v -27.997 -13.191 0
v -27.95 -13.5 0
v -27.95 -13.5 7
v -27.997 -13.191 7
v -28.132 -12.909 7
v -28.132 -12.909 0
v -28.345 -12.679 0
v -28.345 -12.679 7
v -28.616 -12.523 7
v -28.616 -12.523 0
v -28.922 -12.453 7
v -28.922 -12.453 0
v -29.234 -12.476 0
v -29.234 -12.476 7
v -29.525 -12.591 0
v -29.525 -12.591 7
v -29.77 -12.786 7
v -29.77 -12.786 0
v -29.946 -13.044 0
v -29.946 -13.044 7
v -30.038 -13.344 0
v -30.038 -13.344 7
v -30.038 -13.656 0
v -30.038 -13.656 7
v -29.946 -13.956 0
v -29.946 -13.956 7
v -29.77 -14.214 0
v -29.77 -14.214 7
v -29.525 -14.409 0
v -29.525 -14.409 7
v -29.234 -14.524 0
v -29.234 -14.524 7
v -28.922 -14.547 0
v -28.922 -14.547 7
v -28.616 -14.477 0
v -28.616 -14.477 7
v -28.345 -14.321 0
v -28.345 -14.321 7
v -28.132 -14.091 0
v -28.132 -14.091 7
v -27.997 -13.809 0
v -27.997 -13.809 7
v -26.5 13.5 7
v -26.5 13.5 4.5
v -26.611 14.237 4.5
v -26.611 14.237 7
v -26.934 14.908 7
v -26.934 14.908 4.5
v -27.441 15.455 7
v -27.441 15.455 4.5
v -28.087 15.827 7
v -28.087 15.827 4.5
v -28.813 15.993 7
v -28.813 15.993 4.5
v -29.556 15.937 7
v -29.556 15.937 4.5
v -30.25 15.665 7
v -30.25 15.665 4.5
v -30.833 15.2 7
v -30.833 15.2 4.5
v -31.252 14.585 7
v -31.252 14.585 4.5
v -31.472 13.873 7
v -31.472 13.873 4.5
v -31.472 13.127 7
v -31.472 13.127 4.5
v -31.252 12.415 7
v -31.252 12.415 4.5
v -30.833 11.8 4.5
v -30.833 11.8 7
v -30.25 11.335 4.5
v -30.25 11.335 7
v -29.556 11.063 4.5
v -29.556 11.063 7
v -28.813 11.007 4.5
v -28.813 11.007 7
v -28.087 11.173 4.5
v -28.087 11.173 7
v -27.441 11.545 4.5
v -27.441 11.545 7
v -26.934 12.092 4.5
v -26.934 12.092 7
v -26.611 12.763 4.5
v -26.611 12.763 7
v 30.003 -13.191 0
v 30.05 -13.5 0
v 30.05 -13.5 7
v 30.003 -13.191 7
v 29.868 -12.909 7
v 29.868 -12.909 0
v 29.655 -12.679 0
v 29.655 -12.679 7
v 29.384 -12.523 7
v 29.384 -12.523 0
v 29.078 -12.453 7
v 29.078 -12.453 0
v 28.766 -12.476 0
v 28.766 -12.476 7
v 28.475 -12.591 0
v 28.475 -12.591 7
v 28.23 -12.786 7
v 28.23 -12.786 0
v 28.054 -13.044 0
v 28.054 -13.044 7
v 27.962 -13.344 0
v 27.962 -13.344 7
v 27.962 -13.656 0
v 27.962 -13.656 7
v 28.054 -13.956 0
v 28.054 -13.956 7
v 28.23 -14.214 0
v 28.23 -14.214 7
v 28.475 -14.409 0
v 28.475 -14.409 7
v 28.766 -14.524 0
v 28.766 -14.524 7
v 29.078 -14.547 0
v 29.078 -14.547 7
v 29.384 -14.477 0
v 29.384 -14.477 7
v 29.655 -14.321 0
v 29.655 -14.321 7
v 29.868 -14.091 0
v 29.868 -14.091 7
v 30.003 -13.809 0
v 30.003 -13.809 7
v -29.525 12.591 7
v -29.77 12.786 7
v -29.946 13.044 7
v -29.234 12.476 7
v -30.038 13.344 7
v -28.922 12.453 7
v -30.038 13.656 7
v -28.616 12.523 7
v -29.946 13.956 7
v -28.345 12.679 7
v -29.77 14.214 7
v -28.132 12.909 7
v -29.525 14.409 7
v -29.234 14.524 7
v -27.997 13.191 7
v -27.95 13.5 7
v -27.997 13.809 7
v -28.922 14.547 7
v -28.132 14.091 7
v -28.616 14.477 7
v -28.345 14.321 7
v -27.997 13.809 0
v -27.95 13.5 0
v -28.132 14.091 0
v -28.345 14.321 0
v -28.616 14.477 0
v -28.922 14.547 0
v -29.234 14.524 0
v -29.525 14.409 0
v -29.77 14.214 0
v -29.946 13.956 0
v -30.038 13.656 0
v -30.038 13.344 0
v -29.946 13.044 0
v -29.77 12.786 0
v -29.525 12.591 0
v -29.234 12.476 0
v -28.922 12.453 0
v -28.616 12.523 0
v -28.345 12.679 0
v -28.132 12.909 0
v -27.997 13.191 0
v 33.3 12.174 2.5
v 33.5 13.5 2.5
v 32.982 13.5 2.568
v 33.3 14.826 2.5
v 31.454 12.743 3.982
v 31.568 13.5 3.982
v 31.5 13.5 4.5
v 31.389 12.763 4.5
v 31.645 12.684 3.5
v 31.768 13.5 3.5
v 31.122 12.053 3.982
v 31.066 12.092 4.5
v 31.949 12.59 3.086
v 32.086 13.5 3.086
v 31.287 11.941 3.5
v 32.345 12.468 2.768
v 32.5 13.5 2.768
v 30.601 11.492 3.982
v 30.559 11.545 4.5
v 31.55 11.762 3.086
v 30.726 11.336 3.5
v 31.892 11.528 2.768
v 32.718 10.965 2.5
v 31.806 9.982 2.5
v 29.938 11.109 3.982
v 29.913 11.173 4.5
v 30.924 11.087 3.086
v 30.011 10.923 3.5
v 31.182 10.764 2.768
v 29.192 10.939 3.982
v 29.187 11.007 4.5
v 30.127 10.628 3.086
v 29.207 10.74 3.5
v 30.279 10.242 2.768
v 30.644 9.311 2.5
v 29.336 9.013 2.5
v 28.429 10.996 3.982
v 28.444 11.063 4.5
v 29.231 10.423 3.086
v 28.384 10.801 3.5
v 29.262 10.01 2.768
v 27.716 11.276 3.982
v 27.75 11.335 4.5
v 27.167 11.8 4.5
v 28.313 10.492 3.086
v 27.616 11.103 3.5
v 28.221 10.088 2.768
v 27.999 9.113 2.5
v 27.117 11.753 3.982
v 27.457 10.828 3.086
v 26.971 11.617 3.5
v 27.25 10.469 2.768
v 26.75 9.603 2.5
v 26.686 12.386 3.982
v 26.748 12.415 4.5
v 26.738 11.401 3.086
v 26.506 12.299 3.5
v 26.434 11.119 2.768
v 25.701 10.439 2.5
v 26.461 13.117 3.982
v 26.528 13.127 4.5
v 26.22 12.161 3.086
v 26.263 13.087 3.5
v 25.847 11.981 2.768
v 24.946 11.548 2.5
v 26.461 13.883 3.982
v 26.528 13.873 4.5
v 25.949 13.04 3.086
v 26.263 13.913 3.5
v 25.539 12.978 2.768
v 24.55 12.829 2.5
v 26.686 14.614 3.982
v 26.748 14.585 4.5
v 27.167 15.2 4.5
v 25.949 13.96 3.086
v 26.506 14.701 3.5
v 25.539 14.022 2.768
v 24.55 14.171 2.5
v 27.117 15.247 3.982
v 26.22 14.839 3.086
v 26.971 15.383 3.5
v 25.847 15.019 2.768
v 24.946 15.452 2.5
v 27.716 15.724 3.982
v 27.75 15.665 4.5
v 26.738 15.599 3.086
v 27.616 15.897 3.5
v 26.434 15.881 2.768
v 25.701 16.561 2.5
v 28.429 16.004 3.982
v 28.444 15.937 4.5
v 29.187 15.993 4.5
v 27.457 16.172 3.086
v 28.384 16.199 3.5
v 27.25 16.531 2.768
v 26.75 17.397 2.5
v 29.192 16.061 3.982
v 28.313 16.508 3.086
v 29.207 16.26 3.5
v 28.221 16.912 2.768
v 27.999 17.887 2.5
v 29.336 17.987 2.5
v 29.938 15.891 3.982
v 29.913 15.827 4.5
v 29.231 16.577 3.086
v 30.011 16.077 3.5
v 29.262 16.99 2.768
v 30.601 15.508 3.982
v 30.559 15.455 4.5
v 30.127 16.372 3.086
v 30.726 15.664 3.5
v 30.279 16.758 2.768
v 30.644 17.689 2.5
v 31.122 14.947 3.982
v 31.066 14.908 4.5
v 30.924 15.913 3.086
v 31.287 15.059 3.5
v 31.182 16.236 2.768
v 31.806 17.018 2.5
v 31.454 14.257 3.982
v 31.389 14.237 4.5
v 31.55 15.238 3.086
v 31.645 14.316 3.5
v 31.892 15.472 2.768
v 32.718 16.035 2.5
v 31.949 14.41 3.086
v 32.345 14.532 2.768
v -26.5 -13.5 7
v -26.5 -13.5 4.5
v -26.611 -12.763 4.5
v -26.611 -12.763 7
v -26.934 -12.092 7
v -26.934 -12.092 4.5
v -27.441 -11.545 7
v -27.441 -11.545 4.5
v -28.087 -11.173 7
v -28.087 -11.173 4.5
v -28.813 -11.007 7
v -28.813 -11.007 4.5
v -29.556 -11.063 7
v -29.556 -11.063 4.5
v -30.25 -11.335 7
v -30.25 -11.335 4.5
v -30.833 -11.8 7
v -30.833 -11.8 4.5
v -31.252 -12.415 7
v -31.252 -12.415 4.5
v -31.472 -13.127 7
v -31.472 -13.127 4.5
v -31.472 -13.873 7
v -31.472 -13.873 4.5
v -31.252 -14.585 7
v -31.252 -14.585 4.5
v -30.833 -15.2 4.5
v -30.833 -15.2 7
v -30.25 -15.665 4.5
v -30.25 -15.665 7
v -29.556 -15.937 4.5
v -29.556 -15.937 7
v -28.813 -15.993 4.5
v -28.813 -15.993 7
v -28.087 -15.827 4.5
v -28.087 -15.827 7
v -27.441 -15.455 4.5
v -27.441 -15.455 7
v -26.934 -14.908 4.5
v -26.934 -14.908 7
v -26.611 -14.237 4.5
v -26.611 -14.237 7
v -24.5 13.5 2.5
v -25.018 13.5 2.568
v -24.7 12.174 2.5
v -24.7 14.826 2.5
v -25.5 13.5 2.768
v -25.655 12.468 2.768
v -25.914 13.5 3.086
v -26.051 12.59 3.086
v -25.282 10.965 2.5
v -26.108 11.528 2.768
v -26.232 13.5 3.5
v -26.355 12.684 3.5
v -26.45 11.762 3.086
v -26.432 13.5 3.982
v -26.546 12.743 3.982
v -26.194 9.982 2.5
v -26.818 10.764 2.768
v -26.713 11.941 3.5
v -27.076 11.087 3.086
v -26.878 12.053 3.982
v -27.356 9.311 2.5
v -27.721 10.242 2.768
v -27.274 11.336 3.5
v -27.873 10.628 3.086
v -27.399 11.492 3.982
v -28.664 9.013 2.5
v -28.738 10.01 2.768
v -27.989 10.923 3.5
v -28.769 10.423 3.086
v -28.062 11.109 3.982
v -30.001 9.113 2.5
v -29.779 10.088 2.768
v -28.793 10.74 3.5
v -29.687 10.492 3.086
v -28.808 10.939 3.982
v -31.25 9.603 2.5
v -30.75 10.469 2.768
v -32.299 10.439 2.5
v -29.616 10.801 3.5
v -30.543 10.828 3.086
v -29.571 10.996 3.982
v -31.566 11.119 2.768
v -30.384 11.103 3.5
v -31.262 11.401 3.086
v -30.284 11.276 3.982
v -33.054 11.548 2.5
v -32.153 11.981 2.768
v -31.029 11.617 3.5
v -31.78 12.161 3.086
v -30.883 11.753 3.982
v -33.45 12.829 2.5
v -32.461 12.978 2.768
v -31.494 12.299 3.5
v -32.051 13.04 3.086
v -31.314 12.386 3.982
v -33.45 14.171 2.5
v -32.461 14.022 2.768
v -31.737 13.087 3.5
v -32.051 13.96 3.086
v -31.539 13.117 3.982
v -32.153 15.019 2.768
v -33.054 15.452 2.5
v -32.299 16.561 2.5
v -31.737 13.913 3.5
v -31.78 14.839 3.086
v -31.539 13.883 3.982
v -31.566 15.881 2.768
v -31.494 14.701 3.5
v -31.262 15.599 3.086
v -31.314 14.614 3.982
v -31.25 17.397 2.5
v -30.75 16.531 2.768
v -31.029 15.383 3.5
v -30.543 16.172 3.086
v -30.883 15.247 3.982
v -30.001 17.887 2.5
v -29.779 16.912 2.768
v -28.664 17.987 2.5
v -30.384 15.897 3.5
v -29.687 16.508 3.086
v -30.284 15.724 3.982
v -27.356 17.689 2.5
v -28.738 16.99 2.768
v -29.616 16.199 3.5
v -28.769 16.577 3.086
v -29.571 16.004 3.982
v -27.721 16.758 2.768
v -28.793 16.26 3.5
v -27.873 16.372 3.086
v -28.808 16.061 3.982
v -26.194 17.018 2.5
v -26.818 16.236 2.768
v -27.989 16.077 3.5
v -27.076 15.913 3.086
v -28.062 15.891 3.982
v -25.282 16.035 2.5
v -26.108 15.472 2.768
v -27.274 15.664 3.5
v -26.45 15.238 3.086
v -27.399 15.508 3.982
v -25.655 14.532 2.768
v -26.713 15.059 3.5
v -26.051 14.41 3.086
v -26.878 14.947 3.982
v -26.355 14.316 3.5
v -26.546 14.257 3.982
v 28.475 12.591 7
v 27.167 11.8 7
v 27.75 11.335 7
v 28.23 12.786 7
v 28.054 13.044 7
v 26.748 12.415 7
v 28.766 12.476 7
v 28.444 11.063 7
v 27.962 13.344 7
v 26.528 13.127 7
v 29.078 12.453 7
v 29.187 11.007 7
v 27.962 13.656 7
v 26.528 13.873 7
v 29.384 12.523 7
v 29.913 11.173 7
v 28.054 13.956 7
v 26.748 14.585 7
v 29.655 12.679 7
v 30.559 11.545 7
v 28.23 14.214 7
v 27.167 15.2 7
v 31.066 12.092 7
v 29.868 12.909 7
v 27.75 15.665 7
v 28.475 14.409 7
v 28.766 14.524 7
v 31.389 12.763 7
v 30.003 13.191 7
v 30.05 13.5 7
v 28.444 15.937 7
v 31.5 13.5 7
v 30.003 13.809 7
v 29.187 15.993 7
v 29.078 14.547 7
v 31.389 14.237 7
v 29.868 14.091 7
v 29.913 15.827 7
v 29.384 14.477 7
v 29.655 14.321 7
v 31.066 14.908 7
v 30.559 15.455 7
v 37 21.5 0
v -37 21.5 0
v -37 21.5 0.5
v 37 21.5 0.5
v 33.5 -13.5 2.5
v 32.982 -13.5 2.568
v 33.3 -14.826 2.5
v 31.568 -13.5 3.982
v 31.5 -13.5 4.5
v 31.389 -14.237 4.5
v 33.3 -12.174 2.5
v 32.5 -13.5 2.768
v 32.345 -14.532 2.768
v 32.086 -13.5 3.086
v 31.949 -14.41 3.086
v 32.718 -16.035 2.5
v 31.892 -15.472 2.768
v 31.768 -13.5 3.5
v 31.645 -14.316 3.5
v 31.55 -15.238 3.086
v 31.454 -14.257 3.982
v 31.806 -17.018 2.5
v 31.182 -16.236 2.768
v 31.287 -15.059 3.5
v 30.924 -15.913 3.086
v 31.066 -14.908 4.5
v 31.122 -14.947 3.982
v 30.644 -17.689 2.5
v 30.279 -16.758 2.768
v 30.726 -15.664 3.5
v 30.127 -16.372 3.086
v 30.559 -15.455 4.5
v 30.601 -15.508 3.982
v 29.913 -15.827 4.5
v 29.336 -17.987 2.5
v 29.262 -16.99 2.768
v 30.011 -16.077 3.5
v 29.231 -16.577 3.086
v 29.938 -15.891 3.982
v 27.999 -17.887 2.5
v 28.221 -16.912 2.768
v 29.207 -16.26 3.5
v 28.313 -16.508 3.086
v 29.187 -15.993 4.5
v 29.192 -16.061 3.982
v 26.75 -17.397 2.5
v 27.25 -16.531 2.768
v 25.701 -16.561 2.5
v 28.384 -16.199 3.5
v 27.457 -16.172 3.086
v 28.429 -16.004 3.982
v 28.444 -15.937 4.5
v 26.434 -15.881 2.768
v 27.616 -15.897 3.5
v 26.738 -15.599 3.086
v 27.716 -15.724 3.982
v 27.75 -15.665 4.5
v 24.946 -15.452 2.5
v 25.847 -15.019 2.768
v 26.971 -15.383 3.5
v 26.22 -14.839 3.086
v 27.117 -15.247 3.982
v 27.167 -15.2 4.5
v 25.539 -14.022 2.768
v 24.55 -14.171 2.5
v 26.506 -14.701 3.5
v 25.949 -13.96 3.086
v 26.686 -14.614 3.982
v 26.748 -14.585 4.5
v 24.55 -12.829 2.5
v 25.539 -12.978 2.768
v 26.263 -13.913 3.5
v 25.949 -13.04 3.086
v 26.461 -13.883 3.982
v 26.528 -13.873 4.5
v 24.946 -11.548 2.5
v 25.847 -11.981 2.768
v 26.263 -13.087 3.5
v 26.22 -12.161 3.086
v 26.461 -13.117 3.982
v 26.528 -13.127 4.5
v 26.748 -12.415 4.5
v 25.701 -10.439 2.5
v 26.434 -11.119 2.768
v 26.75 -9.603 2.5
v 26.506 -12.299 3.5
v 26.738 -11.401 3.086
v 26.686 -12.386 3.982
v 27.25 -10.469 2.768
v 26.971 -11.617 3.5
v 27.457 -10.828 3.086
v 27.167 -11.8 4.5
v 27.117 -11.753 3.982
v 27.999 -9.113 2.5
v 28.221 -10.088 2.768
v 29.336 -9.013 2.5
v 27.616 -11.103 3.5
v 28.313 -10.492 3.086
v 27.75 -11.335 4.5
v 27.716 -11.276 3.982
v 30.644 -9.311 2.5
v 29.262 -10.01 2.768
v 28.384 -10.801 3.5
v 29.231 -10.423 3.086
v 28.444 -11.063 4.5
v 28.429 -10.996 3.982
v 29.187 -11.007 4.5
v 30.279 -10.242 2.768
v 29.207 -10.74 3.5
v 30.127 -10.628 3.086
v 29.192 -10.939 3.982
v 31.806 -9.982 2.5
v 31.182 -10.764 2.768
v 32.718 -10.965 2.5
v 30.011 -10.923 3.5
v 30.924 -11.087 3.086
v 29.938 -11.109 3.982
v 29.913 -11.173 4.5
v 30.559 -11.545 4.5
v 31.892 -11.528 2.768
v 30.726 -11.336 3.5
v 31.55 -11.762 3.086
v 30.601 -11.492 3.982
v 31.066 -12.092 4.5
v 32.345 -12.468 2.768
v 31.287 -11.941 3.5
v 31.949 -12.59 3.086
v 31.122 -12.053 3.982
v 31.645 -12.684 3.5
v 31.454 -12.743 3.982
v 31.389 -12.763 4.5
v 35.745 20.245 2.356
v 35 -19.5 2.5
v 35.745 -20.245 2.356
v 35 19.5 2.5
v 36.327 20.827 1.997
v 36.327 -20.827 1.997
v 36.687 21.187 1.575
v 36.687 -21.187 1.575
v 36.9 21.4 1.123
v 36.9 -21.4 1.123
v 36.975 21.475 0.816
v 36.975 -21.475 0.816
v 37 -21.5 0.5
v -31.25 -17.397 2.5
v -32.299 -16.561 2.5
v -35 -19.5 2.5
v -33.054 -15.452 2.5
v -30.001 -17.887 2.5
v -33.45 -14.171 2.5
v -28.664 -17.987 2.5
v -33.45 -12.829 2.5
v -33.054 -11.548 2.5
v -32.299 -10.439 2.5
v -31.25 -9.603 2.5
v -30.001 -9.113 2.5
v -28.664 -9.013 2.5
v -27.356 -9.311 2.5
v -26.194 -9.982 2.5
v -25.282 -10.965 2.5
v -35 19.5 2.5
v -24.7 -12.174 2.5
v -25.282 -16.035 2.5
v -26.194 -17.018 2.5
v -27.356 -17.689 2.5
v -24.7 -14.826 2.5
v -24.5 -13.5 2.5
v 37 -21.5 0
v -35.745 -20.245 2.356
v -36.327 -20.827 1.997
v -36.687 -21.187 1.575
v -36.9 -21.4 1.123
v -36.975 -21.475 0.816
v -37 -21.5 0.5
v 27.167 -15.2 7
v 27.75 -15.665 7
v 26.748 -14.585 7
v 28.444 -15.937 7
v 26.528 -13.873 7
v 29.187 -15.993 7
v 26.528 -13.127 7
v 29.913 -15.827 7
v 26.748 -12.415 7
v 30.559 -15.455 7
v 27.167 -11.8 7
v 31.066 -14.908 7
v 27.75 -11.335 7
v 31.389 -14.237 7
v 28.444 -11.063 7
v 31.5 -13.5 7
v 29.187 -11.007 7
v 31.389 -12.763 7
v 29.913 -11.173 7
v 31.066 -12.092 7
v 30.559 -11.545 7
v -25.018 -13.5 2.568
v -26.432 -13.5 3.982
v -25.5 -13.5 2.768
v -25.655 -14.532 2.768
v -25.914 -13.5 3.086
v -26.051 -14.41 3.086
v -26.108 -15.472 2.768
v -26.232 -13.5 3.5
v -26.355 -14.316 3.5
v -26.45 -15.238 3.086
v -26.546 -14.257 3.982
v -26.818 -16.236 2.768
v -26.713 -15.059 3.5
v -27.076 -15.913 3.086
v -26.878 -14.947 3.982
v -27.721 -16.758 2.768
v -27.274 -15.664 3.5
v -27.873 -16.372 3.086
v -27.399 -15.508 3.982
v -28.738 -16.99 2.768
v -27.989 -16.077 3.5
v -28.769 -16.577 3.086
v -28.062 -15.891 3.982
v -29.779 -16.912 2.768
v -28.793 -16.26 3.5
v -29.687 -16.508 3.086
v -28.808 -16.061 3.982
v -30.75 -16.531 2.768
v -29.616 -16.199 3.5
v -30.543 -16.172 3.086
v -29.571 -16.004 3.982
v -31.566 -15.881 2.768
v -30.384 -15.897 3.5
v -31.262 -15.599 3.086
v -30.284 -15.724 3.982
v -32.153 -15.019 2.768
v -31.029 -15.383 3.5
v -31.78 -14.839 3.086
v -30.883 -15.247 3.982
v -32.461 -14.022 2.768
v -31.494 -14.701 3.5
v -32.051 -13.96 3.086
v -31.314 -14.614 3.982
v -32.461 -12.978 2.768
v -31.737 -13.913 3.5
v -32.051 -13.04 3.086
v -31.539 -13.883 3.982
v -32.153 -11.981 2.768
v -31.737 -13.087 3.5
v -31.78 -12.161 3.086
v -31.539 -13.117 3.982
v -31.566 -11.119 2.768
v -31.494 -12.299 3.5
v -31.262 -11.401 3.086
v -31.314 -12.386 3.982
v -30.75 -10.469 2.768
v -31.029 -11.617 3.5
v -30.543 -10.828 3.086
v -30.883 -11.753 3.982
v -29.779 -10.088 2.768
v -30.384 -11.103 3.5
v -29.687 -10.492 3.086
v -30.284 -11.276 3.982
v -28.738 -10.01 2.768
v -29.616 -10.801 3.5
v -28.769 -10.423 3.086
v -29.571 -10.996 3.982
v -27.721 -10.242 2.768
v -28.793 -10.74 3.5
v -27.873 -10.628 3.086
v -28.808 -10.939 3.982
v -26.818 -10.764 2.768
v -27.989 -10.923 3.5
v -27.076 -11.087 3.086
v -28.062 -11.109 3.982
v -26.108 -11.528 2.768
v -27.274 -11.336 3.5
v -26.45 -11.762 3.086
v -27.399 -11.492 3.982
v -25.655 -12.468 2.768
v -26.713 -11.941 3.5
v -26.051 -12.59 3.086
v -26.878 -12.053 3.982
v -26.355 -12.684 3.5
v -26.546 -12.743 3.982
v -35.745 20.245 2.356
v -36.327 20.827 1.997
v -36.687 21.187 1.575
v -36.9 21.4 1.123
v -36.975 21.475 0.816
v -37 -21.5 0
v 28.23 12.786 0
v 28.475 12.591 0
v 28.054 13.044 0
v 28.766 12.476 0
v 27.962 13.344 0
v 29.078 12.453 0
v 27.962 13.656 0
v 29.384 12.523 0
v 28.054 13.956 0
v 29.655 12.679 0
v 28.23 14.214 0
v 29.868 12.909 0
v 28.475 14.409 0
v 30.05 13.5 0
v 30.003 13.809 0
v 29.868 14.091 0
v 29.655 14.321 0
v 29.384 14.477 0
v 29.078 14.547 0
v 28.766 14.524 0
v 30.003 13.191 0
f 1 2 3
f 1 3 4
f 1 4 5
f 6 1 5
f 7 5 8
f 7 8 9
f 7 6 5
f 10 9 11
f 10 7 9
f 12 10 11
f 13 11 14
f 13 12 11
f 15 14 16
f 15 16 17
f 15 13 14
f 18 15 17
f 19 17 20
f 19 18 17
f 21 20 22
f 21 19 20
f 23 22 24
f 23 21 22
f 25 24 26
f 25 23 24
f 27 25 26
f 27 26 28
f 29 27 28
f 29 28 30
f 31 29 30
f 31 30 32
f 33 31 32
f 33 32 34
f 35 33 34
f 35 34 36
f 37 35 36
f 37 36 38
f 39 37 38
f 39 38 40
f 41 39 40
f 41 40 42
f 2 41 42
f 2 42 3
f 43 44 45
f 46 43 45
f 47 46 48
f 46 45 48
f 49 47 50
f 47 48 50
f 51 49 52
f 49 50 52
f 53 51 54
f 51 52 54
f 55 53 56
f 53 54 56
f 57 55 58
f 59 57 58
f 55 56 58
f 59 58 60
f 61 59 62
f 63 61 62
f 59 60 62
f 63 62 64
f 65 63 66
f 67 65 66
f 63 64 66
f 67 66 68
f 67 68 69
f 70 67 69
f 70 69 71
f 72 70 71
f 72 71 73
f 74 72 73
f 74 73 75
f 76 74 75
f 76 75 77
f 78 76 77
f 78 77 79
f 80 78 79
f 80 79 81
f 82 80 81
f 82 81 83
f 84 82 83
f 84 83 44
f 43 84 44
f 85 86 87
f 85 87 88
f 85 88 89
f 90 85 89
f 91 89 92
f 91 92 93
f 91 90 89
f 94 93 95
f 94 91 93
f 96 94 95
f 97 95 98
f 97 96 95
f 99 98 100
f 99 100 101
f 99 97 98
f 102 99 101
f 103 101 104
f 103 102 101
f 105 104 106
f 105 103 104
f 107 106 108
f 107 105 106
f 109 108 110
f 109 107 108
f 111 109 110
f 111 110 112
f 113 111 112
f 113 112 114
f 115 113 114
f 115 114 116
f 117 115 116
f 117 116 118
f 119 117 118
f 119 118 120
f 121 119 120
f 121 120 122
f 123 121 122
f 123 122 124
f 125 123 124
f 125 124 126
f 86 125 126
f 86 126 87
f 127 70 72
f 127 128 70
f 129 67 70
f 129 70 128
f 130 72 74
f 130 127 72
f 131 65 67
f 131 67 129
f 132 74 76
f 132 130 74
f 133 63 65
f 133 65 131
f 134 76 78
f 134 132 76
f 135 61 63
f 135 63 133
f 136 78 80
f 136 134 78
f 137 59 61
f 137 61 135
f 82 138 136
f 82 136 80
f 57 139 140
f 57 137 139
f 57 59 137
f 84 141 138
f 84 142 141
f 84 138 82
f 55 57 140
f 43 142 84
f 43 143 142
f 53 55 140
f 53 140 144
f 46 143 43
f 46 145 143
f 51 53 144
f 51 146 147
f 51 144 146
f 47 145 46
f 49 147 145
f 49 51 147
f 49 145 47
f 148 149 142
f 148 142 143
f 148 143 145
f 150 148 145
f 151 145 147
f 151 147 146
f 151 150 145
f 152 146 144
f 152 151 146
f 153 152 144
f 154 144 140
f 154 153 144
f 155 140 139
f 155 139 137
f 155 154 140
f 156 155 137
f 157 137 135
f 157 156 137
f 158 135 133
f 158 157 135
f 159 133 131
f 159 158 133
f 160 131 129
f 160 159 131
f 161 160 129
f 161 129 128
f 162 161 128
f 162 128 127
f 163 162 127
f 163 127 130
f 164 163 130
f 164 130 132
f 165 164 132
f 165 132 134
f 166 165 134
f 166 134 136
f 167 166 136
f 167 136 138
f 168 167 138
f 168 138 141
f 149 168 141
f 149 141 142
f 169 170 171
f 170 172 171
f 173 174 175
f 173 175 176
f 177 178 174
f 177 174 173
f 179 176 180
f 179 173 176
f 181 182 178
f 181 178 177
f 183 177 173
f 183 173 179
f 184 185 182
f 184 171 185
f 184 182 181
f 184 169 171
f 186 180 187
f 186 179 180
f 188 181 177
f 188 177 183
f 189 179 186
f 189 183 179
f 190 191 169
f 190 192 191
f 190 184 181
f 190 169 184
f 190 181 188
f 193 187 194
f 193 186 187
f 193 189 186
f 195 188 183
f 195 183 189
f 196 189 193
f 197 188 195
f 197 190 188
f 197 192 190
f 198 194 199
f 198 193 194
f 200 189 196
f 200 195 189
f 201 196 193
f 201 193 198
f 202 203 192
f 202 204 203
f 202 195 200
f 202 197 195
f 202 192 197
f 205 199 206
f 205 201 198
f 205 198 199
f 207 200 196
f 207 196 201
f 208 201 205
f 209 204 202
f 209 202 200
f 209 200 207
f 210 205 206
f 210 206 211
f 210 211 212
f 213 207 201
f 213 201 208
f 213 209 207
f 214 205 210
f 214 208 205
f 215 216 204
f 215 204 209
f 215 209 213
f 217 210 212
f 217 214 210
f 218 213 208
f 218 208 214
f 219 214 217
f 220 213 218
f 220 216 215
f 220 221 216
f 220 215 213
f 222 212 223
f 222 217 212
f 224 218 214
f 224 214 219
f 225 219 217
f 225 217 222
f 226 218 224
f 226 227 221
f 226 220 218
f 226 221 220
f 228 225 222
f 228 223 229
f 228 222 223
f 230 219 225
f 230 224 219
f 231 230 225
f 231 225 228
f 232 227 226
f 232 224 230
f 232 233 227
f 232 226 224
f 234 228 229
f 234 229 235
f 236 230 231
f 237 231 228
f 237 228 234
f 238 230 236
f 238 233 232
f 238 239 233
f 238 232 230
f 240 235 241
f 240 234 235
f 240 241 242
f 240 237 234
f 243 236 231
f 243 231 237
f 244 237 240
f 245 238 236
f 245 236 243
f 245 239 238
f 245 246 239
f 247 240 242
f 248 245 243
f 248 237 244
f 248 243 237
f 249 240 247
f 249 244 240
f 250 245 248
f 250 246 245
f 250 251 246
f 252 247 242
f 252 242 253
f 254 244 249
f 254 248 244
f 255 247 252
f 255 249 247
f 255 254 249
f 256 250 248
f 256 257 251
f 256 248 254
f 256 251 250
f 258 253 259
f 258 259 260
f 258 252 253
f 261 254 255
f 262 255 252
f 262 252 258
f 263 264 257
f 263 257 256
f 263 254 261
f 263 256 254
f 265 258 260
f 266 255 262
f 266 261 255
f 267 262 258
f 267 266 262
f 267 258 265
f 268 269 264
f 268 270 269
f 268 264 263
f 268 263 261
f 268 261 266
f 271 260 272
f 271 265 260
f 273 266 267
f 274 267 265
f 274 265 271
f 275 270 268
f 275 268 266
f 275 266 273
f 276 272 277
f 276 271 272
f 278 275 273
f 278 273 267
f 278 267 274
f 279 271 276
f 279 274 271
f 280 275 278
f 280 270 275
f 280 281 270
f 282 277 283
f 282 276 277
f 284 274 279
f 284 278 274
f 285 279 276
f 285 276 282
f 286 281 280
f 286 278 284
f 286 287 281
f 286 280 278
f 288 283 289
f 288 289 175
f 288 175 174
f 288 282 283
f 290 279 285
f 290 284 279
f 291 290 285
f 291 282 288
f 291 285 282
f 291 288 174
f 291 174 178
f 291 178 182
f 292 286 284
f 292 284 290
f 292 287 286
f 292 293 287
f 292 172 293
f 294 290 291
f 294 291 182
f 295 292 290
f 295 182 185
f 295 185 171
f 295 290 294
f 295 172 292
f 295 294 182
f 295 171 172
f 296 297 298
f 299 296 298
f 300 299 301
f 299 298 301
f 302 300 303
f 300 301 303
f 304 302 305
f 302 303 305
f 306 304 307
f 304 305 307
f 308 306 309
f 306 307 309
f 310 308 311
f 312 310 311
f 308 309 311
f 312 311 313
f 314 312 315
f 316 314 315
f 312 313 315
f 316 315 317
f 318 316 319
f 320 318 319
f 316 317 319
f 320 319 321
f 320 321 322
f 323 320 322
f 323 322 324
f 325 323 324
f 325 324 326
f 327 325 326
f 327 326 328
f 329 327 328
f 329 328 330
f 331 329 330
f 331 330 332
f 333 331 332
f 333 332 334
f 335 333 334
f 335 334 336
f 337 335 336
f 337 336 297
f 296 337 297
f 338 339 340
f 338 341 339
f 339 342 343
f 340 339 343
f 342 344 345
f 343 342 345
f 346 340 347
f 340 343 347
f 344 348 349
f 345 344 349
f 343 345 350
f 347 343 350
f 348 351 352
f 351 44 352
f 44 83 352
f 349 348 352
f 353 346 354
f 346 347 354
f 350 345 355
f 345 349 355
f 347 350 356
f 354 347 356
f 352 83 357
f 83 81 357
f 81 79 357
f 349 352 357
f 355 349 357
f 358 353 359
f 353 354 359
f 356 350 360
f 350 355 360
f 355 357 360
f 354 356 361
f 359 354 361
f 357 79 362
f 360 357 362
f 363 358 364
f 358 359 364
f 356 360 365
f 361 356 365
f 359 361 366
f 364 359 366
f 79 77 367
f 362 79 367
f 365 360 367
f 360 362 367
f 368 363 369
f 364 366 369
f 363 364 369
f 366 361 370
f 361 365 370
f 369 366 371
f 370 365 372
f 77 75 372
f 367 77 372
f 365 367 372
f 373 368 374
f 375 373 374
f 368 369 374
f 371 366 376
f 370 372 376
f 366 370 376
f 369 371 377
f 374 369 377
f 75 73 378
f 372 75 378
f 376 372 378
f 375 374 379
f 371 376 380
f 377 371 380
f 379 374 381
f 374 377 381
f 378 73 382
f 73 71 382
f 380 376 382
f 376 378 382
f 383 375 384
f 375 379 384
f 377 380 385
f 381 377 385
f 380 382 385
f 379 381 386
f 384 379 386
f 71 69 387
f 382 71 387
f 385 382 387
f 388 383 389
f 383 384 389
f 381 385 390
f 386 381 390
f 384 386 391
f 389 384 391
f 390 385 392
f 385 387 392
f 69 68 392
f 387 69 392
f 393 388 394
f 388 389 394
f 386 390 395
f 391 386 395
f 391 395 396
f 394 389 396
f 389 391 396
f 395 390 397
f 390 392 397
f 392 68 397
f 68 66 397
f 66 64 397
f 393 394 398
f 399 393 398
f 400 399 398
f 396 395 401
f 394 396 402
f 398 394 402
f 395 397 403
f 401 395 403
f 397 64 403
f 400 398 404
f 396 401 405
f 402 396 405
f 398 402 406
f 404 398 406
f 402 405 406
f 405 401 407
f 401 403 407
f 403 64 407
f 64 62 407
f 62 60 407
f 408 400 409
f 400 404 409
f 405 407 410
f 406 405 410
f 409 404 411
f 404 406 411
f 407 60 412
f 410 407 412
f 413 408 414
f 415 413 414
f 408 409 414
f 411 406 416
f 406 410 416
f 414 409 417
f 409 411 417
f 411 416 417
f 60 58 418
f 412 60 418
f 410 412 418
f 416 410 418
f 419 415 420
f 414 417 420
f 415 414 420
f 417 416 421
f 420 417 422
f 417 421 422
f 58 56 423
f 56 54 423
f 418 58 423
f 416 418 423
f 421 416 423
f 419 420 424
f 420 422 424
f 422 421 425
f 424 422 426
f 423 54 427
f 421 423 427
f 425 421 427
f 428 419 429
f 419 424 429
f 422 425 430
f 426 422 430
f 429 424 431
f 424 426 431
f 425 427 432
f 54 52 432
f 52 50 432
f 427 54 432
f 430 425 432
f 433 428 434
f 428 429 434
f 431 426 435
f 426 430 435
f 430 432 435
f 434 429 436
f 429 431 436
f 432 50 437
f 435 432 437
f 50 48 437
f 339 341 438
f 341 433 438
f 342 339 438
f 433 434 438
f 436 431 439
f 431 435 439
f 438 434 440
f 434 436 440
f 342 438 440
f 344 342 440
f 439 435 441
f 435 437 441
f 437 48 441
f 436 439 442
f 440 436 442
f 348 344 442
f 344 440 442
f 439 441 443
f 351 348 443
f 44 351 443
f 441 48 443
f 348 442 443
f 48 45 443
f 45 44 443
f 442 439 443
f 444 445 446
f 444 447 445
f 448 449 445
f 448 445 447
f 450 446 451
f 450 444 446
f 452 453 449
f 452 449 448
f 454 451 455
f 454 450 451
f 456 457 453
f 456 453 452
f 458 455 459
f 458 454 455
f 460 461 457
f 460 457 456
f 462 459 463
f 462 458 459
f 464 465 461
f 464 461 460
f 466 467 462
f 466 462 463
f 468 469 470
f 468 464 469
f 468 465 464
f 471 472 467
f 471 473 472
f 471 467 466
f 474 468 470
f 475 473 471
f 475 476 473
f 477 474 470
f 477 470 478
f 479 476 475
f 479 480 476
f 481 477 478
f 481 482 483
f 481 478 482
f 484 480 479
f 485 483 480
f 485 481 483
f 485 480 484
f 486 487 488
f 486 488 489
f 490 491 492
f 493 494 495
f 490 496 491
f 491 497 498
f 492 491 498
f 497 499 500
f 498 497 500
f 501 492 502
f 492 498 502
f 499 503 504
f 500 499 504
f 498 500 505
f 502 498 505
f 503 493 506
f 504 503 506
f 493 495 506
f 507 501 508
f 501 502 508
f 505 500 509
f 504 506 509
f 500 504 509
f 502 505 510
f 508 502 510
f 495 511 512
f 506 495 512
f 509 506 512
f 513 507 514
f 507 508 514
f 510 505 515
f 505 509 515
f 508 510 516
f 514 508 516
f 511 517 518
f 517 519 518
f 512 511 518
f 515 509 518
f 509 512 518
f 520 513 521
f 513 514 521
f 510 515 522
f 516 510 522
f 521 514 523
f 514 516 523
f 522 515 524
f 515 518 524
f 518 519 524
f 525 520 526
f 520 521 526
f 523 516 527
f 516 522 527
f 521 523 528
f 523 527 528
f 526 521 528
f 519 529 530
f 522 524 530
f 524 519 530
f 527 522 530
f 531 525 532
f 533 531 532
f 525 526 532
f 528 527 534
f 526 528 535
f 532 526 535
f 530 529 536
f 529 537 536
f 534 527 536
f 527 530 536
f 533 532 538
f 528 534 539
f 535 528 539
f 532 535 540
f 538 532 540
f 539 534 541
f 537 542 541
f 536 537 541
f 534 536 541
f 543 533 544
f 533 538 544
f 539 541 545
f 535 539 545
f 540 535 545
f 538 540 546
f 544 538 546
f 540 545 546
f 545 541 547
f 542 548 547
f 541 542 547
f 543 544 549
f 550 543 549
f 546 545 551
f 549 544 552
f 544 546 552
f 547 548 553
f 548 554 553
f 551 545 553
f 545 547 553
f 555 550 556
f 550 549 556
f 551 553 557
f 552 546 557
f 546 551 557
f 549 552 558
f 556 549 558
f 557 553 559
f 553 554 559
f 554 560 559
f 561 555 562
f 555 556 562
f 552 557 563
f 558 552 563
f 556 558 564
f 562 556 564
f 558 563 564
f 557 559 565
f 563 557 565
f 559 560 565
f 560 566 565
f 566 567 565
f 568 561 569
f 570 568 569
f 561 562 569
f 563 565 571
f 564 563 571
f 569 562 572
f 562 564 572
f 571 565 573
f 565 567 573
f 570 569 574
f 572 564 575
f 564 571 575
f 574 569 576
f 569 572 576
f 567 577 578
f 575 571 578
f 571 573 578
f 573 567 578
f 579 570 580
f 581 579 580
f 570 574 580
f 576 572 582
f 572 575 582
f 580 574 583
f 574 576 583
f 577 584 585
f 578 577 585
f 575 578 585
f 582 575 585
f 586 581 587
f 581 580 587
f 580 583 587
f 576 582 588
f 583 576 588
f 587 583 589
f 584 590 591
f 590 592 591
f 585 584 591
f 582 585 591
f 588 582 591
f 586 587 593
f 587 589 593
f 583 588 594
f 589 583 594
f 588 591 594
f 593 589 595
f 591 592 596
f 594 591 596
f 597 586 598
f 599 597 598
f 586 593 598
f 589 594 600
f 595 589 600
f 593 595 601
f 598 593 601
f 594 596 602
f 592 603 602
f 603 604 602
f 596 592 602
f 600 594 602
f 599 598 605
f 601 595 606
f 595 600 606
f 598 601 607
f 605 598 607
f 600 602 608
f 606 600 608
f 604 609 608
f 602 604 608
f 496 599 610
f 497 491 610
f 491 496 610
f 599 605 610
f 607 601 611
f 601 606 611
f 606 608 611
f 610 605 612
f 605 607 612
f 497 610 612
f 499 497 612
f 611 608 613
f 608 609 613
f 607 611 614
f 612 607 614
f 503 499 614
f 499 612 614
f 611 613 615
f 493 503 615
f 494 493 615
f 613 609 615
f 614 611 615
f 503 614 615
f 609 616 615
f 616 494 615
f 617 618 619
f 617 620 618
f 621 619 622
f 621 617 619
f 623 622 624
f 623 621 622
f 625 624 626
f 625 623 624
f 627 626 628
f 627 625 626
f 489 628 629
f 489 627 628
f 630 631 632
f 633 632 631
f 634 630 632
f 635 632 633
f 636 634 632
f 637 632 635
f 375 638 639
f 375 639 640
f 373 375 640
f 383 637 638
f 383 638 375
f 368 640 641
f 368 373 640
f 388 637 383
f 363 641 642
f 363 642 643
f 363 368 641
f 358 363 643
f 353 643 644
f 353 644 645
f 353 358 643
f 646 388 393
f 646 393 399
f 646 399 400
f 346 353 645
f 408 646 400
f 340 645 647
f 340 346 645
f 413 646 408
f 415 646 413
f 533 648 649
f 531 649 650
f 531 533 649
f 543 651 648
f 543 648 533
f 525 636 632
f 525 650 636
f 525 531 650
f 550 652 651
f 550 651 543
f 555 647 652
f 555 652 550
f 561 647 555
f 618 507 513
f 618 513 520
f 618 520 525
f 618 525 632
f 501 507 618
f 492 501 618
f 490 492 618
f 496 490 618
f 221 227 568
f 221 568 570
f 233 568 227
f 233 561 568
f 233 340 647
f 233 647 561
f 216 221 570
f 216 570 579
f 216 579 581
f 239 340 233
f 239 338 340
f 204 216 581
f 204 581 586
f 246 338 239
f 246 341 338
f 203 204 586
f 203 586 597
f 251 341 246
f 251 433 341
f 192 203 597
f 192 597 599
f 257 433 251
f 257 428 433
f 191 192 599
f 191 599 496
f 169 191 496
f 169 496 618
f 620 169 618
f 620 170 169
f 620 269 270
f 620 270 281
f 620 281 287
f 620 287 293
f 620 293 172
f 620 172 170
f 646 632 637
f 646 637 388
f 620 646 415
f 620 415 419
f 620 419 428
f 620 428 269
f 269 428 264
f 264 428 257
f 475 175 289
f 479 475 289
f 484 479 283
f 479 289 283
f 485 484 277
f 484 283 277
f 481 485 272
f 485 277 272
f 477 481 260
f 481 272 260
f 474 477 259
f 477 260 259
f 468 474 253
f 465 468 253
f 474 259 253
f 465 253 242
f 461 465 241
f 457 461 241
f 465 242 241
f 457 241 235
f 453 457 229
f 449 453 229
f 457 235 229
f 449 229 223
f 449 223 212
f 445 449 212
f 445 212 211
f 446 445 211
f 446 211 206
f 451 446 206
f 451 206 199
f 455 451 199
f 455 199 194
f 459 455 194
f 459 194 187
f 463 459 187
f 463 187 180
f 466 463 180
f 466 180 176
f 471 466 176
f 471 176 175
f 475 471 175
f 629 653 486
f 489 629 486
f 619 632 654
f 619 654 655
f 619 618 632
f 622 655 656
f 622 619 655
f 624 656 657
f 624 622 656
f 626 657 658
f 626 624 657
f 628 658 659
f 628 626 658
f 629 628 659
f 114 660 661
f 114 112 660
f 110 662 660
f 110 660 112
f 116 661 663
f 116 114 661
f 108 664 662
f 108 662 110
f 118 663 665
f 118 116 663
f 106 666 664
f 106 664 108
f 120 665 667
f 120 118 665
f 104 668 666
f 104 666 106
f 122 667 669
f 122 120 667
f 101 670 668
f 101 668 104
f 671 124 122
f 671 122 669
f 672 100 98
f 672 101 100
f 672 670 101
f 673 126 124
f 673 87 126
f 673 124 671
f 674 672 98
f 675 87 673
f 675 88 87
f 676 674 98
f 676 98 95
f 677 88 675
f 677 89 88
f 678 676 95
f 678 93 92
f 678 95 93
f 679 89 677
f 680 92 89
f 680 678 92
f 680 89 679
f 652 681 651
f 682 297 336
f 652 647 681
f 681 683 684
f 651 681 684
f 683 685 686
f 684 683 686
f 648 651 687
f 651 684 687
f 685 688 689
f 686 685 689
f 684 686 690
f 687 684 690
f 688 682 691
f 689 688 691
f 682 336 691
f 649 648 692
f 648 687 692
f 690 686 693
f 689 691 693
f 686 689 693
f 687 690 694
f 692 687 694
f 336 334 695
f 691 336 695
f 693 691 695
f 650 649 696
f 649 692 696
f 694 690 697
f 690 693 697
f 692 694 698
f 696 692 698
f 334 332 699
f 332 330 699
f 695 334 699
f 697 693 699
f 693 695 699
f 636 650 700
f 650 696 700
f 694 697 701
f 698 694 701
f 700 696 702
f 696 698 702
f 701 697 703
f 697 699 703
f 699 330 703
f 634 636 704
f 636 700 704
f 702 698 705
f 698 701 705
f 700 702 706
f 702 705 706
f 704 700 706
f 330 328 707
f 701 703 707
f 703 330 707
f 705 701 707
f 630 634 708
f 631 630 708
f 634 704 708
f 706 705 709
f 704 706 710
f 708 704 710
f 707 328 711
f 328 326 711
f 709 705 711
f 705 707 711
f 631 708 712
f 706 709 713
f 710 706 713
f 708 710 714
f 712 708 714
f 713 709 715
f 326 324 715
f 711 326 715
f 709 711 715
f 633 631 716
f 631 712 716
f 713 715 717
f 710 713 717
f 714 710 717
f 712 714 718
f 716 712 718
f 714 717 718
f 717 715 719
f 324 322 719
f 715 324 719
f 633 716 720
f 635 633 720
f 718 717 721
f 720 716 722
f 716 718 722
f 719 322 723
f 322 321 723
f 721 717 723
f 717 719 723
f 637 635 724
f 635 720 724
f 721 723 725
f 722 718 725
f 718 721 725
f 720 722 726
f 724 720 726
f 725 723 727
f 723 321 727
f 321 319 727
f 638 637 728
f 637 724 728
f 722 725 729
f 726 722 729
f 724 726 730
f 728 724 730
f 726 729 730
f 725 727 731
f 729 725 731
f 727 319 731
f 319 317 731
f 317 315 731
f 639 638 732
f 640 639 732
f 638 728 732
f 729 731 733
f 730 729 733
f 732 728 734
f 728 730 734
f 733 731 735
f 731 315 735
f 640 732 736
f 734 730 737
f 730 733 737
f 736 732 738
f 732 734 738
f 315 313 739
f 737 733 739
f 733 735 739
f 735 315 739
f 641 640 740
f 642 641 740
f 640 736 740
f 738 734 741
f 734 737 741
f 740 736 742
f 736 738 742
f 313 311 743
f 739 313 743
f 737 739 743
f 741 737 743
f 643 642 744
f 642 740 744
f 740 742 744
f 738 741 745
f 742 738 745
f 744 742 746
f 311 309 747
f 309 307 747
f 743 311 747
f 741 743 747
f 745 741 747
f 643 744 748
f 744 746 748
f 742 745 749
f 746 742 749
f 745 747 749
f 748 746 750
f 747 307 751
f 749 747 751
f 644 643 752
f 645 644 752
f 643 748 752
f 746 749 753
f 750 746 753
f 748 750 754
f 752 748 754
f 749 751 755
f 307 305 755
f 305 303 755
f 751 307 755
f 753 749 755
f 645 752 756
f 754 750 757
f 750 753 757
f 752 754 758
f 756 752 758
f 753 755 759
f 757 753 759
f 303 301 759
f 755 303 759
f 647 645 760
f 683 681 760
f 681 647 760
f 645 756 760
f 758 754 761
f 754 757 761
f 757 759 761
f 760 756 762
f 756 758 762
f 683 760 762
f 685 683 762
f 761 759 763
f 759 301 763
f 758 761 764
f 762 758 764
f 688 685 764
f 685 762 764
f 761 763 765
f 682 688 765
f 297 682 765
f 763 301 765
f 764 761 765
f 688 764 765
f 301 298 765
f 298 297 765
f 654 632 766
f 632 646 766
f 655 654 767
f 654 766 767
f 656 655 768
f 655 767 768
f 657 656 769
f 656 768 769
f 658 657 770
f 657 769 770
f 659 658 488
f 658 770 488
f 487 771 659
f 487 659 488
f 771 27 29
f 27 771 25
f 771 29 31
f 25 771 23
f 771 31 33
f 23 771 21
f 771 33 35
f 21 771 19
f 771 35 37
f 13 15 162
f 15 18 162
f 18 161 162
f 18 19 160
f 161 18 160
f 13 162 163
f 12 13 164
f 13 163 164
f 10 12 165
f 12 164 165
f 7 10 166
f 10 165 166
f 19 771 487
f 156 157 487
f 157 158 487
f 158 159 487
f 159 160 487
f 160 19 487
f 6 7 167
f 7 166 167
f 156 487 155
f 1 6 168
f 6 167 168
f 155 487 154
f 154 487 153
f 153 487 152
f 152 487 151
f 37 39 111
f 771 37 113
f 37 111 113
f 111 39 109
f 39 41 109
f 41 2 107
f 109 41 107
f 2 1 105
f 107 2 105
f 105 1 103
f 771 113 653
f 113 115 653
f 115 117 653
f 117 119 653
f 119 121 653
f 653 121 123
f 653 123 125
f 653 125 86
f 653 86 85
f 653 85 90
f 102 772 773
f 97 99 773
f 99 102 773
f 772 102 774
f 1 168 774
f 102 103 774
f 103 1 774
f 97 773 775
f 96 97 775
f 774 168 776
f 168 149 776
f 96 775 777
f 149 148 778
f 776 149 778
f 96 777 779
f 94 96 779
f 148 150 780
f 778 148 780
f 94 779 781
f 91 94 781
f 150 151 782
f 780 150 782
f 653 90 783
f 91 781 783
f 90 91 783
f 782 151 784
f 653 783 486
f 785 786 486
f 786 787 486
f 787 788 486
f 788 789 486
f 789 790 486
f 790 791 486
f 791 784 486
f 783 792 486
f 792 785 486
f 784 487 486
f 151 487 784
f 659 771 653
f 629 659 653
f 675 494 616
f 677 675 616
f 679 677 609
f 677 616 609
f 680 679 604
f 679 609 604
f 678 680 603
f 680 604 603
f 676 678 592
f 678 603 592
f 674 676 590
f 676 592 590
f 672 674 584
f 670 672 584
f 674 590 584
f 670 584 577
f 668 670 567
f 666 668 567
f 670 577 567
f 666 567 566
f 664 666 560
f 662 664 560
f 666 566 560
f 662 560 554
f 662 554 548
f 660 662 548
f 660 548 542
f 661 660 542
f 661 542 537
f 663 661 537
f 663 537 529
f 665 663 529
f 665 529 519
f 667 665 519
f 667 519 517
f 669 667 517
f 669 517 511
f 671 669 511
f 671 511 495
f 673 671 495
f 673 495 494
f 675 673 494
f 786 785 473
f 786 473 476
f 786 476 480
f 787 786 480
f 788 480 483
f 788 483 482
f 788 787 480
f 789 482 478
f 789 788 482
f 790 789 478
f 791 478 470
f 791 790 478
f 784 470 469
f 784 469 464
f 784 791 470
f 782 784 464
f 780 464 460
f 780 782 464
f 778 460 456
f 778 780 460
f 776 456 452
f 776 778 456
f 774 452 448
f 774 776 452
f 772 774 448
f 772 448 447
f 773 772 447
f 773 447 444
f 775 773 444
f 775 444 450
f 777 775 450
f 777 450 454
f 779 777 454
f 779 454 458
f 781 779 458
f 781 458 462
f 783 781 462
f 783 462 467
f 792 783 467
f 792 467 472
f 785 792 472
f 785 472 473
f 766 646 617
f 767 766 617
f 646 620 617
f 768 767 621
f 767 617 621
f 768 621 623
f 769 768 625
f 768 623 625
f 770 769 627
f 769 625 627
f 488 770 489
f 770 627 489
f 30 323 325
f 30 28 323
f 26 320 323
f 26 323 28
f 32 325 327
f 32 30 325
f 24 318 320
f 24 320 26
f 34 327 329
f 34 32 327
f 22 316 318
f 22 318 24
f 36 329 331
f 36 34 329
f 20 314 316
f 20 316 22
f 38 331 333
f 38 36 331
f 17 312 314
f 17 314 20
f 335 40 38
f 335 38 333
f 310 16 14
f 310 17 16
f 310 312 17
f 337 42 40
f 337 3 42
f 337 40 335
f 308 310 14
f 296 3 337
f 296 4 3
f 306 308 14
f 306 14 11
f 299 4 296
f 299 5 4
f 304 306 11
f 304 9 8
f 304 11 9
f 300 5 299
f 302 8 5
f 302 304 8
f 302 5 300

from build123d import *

# Parameters (mm, degrees)
SKETCH001_W  = 74
SKETCH001_H  = 43
SKETCH001_R  = 1.05
PAD_DEPTH    = 2.5
SKETCH_R     = 2.5
SKETCH_R_2   = 1.05
PAD001_DEPTH = 7
FILLET_R     = 2


with BuildPart() as part:
    # Sketch001 → Pad (new body)
    with BuildSketch(Plane.XY):
        Rectangle(SKETCH001_W, SKETCH001_H)
        with Locations((-29, -13.5)):
            Circle(SKETCH001_R, mode=Mode.SUBTRACT)
        with Locations((29, -13.5)):
            Circle(SKETCH001_R, mode=Mode.SUBTRACT)
        with Locations((29, 13.5)):
            Circle(SKETCH001_R, mode=Mode.SUBTRACT)
        with Locations((-29, 13.5)):
            Circle(SKETCH001_R, mode=Mode.SUBTRACT)
    extrude(amount=PAD_DEPTH)

    # Sketch → Pad001 (join)
    with BuildSketch(Plane.XY):
        with Locations((-29, 13.5)):
            Circle(SKETCH_R)
        with Locations((-29, 13.5)):
            Circle(SKETCH_R_2, mode=Mode.SUBTRACT)
        with Locations((-29, -13.5)):
            Circle(SKETCH_R)
        with Locations((-29, -13.5)):
            Circle(SKETCH_R_2, mode=Mode.SUBTRACT)
        with Locations((29, -13.5)):
            Circle(SKETCH_R)
        with Locations((29, -13.5)):
            Circle(SKETCH_R_2, mode=Mode.SUBTRACT)
        with Locations((29, 13.5)):
            Circle(SKETCH_R)
        with Locations((29, 13.5)):
            Circle(SKETCH_R_2, mode=Mode.SUBTRACT)
    extrude(amount=PAD001_DEPTH)

    # Fillet
    fillet_edges = [part.edges().sort_by_distance(p)[0] for p in [
        (-37, 0, 2.5),
        (0, 21.5, 2.5),
        (0, -21.5, 2.5),
        (37, 0, 2.5),
        (-31.5, -13.5, 2.5),
        (26.5, -13.5, 2.5),
        (-31.5, 13.5, 2.5),
        (26.5, 13.5, 2.5),
    ]]
    fillet(fillet_edges, radius=FILLET_R)


solid = part.part
